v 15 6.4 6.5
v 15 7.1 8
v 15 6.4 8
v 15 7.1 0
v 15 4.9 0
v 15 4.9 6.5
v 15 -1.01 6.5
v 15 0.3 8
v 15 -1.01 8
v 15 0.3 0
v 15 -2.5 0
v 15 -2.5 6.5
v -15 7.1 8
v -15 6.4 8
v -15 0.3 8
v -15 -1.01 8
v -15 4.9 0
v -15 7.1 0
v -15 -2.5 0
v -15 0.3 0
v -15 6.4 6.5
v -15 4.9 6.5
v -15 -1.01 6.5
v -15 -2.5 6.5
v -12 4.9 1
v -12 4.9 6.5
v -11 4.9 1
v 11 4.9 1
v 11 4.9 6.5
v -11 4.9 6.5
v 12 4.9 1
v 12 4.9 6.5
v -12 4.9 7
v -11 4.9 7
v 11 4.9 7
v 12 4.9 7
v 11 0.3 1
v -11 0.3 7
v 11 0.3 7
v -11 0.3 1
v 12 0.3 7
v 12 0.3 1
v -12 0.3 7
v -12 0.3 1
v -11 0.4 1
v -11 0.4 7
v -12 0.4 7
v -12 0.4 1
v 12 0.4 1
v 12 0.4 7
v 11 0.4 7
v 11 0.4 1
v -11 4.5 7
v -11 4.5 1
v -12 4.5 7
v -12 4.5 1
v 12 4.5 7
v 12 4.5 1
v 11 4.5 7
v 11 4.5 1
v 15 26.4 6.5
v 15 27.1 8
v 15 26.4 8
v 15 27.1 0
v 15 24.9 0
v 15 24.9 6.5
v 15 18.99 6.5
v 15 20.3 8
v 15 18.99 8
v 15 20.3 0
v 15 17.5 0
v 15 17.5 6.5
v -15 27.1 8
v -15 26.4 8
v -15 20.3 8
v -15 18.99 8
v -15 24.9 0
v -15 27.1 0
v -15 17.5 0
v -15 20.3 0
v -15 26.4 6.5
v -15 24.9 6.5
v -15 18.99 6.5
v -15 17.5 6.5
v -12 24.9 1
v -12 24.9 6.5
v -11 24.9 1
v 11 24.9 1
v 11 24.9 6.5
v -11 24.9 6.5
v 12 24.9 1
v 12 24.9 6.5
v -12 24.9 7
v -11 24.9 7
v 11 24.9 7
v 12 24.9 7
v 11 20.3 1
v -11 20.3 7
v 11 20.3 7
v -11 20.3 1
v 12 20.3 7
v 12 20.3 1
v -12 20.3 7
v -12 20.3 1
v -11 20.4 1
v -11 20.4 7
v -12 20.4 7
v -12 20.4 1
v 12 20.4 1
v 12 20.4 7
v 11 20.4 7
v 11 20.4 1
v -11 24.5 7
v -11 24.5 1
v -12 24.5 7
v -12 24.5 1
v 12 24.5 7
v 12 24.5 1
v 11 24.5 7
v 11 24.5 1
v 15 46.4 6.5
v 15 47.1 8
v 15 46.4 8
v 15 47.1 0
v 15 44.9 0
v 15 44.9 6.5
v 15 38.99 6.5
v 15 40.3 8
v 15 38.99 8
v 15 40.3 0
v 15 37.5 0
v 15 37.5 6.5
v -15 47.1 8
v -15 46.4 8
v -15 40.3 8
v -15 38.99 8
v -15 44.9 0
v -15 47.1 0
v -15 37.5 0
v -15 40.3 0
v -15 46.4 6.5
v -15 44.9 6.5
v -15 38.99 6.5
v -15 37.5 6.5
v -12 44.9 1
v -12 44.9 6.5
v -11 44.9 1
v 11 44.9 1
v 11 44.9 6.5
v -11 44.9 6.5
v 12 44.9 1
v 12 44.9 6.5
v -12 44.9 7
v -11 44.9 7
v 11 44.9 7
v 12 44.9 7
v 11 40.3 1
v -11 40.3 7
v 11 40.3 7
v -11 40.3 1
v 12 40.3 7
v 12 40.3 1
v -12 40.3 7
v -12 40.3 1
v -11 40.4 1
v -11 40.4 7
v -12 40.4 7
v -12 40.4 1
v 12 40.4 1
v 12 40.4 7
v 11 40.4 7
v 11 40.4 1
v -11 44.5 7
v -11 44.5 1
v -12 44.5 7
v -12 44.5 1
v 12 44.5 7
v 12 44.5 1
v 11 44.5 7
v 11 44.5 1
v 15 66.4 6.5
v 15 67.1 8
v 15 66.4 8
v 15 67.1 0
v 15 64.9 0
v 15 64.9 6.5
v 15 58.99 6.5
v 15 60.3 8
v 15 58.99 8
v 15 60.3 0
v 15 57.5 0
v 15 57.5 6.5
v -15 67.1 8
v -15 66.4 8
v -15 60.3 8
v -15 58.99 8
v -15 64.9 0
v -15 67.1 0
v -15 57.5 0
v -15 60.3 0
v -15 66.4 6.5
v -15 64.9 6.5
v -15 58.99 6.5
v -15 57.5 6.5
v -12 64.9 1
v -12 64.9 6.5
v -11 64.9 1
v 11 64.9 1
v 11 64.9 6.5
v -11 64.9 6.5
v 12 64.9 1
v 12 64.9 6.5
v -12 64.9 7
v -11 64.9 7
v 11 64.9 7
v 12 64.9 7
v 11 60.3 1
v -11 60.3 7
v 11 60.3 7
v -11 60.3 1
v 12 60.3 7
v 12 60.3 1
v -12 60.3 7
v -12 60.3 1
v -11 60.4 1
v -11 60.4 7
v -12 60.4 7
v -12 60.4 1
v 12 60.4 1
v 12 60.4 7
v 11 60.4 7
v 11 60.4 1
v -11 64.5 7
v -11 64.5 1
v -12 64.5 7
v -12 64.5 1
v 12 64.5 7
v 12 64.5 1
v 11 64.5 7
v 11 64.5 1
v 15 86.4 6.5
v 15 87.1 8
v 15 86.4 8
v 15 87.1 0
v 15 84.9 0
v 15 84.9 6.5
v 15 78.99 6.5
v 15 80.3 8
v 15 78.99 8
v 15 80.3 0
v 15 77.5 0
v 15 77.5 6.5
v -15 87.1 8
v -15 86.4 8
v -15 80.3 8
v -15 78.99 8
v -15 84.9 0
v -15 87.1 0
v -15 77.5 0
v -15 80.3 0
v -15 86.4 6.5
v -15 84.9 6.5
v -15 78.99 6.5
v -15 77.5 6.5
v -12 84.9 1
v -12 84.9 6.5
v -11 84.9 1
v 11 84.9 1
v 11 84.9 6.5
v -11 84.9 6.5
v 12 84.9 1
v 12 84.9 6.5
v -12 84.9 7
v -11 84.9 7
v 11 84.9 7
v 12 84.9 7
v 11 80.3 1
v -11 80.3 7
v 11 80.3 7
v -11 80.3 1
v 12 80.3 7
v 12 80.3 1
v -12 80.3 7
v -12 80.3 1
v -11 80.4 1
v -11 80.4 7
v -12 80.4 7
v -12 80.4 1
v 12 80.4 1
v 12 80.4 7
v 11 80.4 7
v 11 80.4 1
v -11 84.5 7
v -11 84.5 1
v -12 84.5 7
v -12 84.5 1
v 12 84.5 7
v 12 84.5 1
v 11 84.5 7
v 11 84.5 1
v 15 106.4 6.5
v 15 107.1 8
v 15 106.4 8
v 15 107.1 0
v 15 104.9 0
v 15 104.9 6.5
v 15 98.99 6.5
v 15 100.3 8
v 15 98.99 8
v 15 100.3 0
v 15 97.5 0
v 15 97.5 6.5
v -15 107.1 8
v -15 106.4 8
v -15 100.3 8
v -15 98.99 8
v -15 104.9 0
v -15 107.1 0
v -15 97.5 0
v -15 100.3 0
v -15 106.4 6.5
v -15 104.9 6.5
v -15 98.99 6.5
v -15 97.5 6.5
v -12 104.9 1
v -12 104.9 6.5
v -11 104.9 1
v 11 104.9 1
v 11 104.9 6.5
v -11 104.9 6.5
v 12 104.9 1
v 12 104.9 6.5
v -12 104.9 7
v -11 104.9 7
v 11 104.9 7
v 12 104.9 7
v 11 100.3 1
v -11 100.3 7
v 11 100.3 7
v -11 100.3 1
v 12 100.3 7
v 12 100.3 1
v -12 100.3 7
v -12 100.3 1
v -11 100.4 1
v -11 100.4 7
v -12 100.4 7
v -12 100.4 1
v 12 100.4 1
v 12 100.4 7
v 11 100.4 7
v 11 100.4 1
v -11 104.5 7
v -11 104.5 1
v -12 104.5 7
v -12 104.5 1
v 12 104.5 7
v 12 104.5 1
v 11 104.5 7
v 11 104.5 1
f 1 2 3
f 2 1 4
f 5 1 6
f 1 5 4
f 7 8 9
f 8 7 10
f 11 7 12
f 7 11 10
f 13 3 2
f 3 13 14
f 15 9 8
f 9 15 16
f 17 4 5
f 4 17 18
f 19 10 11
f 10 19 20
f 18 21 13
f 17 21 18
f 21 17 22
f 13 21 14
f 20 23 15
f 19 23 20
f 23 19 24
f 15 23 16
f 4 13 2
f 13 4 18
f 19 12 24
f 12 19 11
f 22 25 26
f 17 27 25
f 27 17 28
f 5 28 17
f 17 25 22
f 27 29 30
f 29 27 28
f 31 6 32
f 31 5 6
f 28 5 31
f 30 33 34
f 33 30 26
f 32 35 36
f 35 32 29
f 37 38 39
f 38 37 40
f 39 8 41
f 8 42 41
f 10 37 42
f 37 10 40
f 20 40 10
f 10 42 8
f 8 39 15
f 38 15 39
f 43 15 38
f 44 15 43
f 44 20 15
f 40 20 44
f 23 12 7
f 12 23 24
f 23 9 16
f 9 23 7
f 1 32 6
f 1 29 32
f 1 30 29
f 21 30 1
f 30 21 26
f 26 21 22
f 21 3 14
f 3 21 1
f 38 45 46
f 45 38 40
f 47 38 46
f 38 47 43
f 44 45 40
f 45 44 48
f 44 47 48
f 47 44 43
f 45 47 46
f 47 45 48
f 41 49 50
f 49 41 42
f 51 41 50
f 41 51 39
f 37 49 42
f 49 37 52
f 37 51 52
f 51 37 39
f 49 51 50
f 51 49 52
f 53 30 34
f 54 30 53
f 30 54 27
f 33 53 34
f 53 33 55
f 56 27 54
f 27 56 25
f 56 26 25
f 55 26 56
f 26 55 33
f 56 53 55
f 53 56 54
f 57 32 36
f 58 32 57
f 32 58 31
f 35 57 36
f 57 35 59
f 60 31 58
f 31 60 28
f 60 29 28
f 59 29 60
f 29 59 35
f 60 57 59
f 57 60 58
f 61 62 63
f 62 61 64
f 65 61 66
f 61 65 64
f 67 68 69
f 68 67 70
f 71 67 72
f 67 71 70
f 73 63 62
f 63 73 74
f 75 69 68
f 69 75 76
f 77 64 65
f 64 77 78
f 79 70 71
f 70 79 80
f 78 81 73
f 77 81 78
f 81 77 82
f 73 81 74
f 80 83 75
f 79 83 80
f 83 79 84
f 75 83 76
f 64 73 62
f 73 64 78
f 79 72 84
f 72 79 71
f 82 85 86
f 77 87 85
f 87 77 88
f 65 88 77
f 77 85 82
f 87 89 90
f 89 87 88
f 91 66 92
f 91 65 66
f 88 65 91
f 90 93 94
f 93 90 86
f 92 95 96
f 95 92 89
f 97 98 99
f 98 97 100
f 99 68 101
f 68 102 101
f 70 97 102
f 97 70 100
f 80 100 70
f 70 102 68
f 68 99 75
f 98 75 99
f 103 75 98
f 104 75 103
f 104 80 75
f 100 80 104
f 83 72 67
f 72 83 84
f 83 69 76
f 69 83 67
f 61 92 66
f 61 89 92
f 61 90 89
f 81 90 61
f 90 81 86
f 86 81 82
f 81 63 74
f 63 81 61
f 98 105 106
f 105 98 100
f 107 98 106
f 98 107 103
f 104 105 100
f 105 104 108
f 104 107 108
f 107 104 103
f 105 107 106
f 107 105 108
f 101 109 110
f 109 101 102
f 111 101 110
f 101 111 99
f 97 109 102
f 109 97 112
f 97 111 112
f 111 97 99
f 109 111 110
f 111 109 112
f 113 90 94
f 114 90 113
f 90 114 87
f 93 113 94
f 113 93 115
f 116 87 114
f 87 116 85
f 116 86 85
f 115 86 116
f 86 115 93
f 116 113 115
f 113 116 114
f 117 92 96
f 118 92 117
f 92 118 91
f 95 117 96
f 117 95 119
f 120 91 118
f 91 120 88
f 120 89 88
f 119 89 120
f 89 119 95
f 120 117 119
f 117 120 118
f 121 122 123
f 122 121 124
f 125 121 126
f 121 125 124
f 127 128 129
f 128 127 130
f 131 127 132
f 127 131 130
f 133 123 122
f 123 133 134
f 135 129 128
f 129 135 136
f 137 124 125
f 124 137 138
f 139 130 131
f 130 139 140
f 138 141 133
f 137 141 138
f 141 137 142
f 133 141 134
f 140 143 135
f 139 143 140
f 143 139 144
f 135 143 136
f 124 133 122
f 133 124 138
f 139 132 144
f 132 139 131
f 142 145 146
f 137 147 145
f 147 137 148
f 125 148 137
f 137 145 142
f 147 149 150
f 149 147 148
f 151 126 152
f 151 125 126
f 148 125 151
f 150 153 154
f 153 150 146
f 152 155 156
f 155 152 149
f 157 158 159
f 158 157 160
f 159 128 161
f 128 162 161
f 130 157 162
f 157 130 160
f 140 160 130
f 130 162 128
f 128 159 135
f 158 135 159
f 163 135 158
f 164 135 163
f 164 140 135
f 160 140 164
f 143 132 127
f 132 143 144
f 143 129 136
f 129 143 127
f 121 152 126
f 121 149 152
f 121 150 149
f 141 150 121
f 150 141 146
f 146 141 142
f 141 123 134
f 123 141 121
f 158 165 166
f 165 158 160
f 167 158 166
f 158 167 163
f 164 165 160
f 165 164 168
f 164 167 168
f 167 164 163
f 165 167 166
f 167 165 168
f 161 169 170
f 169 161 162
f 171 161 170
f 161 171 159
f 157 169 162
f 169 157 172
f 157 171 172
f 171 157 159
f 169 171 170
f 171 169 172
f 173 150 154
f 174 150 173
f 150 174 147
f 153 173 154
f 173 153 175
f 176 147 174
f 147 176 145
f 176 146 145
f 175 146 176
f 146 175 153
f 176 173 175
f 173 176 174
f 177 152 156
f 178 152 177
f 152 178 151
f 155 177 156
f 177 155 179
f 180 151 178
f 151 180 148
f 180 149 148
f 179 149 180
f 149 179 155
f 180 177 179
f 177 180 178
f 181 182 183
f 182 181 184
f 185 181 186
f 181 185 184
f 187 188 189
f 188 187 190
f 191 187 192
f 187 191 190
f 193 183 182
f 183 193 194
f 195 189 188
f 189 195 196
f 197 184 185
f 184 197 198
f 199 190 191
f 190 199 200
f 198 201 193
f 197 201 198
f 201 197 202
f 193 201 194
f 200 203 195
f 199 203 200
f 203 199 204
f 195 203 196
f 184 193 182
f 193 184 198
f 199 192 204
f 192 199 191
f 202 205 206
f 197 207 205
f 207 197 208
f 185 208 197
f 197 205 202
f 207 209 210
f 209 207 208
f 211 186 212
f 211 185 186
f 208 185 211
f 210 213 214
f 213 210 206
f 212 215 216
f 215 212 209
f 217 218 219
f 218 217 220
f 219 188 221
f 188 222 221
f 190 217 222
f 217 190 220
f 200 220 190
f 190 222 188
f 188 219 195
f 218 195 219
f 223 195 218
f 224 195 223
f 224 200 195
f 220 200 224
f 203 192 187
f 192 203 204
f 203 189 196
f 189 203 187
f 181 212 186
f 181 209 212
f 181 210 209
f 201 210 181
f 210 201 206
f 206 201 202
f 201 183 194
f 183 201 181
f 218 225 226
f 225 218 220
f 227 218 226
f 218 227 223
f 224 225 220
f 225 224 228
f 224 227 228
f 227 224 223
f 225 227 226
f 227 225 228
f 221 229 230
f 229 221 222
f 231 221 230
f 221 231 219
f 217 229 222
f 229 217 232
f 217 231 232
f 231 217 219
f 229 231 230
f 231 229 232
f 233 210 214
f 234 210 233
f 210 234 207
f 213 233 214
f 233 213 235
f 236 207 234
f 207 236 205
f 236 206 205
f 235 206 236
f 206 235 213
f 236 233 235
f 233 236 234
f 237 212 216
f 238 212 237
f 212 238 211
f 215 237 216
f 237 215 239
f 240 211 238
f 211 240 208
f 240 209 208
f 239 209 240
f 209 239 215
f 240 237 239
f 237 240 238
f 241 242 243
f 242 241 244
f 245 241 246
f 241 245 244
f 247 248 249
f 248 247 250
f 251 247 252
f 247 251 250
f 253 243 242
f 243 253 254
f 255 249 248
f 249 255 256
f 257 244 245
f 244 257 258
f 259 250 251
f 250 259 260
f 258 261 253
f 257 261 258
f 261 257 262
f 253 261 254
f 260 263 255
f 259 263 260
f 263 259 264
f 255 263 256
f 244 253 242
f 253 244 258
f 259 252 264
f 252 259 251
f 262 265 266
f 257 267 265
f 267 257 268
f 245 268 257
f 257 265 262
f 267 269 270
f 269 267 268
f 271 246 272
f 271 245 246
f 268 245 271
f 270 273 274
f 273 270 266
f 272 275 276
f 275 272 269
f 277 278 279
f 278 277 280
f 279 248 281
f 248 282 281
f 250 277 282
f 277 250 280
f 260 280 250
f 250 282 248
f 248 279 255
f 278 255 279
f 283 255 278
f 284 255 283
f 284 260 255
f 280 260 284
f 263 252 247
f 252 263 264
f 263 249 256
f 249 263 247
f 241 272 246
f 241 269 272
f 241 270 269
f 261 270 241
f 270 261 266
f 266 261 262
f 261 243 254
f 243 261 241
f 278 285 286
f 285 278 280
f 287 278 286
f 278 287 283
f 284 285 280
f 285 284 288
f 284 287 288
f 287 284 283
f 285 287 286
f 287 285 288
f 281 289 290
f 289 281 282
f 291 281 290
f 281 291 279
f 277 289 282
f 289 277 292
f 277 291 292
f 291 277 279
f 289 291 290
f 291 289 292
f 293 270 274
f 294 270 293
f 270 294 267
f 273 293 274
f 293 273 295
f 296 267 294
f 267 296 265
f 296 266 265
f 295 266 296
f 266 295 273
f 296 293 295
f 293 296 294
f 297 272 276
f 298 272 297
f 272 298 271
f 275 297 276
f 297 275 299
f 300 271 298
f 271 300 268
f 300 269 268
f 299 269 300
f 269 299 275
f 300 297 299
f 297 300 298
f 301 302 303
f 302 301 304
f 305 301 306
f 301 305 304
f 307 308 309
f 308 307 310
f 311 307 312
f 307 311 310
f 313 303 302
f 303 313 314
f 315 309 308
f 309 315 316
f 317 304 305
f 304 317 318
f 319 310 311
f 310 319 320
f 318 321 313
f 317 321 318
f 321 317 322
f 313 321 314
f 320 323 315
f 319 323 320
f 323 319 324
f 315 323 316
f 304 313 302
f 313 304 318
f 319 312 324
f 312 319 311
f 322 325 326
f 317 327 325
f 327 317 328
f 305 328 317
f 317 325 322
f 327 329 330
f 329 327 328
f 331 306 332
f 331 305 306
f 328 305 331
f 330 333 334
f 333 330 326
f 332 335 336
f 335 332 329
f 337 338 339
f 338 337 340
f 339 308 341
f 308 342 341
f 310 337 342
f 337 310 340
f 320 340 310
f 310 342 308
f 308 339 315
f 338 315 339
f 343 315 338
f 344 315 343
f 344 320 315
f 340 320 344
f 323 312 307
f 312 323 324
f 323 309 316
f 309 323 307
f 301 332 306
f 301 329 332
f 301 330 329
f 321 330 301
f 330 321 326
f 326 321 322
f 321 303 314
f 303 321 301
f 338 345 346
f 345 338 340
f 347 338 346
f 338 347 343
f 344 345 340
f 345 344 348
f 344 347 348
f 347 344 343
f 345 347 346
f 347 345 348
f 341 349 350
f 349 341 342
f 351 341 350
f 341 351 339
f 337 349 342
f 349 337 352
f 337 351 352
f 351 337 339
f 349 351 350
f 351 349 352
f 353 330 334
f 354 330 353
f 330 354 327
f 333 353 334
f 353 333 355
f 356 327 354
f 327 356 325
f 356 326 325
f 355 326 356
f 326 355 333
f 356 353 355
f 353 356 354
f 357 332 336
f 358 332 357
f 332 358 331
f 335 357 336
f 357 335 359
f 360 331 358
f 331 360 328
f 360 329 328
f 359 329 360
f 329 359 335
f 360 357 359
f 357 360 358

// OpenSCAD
include <protective_storage_box.scad>
lid_angle = 0;
show_tray_in_assembly = false;
render_assembly = false;
// Print 4-6 clamps: 2 per joint (front + back wall), for bottom and lid
split_clamp();
translate([0, 20, 0]) split_clamp();
translate([0, 40, 0]) split_clamp();
translate([0, 60, 0]) split_clamp();
translate([0, 80, 0]) split_clamp();
translate([0, 100, 0]) split_clamp();
